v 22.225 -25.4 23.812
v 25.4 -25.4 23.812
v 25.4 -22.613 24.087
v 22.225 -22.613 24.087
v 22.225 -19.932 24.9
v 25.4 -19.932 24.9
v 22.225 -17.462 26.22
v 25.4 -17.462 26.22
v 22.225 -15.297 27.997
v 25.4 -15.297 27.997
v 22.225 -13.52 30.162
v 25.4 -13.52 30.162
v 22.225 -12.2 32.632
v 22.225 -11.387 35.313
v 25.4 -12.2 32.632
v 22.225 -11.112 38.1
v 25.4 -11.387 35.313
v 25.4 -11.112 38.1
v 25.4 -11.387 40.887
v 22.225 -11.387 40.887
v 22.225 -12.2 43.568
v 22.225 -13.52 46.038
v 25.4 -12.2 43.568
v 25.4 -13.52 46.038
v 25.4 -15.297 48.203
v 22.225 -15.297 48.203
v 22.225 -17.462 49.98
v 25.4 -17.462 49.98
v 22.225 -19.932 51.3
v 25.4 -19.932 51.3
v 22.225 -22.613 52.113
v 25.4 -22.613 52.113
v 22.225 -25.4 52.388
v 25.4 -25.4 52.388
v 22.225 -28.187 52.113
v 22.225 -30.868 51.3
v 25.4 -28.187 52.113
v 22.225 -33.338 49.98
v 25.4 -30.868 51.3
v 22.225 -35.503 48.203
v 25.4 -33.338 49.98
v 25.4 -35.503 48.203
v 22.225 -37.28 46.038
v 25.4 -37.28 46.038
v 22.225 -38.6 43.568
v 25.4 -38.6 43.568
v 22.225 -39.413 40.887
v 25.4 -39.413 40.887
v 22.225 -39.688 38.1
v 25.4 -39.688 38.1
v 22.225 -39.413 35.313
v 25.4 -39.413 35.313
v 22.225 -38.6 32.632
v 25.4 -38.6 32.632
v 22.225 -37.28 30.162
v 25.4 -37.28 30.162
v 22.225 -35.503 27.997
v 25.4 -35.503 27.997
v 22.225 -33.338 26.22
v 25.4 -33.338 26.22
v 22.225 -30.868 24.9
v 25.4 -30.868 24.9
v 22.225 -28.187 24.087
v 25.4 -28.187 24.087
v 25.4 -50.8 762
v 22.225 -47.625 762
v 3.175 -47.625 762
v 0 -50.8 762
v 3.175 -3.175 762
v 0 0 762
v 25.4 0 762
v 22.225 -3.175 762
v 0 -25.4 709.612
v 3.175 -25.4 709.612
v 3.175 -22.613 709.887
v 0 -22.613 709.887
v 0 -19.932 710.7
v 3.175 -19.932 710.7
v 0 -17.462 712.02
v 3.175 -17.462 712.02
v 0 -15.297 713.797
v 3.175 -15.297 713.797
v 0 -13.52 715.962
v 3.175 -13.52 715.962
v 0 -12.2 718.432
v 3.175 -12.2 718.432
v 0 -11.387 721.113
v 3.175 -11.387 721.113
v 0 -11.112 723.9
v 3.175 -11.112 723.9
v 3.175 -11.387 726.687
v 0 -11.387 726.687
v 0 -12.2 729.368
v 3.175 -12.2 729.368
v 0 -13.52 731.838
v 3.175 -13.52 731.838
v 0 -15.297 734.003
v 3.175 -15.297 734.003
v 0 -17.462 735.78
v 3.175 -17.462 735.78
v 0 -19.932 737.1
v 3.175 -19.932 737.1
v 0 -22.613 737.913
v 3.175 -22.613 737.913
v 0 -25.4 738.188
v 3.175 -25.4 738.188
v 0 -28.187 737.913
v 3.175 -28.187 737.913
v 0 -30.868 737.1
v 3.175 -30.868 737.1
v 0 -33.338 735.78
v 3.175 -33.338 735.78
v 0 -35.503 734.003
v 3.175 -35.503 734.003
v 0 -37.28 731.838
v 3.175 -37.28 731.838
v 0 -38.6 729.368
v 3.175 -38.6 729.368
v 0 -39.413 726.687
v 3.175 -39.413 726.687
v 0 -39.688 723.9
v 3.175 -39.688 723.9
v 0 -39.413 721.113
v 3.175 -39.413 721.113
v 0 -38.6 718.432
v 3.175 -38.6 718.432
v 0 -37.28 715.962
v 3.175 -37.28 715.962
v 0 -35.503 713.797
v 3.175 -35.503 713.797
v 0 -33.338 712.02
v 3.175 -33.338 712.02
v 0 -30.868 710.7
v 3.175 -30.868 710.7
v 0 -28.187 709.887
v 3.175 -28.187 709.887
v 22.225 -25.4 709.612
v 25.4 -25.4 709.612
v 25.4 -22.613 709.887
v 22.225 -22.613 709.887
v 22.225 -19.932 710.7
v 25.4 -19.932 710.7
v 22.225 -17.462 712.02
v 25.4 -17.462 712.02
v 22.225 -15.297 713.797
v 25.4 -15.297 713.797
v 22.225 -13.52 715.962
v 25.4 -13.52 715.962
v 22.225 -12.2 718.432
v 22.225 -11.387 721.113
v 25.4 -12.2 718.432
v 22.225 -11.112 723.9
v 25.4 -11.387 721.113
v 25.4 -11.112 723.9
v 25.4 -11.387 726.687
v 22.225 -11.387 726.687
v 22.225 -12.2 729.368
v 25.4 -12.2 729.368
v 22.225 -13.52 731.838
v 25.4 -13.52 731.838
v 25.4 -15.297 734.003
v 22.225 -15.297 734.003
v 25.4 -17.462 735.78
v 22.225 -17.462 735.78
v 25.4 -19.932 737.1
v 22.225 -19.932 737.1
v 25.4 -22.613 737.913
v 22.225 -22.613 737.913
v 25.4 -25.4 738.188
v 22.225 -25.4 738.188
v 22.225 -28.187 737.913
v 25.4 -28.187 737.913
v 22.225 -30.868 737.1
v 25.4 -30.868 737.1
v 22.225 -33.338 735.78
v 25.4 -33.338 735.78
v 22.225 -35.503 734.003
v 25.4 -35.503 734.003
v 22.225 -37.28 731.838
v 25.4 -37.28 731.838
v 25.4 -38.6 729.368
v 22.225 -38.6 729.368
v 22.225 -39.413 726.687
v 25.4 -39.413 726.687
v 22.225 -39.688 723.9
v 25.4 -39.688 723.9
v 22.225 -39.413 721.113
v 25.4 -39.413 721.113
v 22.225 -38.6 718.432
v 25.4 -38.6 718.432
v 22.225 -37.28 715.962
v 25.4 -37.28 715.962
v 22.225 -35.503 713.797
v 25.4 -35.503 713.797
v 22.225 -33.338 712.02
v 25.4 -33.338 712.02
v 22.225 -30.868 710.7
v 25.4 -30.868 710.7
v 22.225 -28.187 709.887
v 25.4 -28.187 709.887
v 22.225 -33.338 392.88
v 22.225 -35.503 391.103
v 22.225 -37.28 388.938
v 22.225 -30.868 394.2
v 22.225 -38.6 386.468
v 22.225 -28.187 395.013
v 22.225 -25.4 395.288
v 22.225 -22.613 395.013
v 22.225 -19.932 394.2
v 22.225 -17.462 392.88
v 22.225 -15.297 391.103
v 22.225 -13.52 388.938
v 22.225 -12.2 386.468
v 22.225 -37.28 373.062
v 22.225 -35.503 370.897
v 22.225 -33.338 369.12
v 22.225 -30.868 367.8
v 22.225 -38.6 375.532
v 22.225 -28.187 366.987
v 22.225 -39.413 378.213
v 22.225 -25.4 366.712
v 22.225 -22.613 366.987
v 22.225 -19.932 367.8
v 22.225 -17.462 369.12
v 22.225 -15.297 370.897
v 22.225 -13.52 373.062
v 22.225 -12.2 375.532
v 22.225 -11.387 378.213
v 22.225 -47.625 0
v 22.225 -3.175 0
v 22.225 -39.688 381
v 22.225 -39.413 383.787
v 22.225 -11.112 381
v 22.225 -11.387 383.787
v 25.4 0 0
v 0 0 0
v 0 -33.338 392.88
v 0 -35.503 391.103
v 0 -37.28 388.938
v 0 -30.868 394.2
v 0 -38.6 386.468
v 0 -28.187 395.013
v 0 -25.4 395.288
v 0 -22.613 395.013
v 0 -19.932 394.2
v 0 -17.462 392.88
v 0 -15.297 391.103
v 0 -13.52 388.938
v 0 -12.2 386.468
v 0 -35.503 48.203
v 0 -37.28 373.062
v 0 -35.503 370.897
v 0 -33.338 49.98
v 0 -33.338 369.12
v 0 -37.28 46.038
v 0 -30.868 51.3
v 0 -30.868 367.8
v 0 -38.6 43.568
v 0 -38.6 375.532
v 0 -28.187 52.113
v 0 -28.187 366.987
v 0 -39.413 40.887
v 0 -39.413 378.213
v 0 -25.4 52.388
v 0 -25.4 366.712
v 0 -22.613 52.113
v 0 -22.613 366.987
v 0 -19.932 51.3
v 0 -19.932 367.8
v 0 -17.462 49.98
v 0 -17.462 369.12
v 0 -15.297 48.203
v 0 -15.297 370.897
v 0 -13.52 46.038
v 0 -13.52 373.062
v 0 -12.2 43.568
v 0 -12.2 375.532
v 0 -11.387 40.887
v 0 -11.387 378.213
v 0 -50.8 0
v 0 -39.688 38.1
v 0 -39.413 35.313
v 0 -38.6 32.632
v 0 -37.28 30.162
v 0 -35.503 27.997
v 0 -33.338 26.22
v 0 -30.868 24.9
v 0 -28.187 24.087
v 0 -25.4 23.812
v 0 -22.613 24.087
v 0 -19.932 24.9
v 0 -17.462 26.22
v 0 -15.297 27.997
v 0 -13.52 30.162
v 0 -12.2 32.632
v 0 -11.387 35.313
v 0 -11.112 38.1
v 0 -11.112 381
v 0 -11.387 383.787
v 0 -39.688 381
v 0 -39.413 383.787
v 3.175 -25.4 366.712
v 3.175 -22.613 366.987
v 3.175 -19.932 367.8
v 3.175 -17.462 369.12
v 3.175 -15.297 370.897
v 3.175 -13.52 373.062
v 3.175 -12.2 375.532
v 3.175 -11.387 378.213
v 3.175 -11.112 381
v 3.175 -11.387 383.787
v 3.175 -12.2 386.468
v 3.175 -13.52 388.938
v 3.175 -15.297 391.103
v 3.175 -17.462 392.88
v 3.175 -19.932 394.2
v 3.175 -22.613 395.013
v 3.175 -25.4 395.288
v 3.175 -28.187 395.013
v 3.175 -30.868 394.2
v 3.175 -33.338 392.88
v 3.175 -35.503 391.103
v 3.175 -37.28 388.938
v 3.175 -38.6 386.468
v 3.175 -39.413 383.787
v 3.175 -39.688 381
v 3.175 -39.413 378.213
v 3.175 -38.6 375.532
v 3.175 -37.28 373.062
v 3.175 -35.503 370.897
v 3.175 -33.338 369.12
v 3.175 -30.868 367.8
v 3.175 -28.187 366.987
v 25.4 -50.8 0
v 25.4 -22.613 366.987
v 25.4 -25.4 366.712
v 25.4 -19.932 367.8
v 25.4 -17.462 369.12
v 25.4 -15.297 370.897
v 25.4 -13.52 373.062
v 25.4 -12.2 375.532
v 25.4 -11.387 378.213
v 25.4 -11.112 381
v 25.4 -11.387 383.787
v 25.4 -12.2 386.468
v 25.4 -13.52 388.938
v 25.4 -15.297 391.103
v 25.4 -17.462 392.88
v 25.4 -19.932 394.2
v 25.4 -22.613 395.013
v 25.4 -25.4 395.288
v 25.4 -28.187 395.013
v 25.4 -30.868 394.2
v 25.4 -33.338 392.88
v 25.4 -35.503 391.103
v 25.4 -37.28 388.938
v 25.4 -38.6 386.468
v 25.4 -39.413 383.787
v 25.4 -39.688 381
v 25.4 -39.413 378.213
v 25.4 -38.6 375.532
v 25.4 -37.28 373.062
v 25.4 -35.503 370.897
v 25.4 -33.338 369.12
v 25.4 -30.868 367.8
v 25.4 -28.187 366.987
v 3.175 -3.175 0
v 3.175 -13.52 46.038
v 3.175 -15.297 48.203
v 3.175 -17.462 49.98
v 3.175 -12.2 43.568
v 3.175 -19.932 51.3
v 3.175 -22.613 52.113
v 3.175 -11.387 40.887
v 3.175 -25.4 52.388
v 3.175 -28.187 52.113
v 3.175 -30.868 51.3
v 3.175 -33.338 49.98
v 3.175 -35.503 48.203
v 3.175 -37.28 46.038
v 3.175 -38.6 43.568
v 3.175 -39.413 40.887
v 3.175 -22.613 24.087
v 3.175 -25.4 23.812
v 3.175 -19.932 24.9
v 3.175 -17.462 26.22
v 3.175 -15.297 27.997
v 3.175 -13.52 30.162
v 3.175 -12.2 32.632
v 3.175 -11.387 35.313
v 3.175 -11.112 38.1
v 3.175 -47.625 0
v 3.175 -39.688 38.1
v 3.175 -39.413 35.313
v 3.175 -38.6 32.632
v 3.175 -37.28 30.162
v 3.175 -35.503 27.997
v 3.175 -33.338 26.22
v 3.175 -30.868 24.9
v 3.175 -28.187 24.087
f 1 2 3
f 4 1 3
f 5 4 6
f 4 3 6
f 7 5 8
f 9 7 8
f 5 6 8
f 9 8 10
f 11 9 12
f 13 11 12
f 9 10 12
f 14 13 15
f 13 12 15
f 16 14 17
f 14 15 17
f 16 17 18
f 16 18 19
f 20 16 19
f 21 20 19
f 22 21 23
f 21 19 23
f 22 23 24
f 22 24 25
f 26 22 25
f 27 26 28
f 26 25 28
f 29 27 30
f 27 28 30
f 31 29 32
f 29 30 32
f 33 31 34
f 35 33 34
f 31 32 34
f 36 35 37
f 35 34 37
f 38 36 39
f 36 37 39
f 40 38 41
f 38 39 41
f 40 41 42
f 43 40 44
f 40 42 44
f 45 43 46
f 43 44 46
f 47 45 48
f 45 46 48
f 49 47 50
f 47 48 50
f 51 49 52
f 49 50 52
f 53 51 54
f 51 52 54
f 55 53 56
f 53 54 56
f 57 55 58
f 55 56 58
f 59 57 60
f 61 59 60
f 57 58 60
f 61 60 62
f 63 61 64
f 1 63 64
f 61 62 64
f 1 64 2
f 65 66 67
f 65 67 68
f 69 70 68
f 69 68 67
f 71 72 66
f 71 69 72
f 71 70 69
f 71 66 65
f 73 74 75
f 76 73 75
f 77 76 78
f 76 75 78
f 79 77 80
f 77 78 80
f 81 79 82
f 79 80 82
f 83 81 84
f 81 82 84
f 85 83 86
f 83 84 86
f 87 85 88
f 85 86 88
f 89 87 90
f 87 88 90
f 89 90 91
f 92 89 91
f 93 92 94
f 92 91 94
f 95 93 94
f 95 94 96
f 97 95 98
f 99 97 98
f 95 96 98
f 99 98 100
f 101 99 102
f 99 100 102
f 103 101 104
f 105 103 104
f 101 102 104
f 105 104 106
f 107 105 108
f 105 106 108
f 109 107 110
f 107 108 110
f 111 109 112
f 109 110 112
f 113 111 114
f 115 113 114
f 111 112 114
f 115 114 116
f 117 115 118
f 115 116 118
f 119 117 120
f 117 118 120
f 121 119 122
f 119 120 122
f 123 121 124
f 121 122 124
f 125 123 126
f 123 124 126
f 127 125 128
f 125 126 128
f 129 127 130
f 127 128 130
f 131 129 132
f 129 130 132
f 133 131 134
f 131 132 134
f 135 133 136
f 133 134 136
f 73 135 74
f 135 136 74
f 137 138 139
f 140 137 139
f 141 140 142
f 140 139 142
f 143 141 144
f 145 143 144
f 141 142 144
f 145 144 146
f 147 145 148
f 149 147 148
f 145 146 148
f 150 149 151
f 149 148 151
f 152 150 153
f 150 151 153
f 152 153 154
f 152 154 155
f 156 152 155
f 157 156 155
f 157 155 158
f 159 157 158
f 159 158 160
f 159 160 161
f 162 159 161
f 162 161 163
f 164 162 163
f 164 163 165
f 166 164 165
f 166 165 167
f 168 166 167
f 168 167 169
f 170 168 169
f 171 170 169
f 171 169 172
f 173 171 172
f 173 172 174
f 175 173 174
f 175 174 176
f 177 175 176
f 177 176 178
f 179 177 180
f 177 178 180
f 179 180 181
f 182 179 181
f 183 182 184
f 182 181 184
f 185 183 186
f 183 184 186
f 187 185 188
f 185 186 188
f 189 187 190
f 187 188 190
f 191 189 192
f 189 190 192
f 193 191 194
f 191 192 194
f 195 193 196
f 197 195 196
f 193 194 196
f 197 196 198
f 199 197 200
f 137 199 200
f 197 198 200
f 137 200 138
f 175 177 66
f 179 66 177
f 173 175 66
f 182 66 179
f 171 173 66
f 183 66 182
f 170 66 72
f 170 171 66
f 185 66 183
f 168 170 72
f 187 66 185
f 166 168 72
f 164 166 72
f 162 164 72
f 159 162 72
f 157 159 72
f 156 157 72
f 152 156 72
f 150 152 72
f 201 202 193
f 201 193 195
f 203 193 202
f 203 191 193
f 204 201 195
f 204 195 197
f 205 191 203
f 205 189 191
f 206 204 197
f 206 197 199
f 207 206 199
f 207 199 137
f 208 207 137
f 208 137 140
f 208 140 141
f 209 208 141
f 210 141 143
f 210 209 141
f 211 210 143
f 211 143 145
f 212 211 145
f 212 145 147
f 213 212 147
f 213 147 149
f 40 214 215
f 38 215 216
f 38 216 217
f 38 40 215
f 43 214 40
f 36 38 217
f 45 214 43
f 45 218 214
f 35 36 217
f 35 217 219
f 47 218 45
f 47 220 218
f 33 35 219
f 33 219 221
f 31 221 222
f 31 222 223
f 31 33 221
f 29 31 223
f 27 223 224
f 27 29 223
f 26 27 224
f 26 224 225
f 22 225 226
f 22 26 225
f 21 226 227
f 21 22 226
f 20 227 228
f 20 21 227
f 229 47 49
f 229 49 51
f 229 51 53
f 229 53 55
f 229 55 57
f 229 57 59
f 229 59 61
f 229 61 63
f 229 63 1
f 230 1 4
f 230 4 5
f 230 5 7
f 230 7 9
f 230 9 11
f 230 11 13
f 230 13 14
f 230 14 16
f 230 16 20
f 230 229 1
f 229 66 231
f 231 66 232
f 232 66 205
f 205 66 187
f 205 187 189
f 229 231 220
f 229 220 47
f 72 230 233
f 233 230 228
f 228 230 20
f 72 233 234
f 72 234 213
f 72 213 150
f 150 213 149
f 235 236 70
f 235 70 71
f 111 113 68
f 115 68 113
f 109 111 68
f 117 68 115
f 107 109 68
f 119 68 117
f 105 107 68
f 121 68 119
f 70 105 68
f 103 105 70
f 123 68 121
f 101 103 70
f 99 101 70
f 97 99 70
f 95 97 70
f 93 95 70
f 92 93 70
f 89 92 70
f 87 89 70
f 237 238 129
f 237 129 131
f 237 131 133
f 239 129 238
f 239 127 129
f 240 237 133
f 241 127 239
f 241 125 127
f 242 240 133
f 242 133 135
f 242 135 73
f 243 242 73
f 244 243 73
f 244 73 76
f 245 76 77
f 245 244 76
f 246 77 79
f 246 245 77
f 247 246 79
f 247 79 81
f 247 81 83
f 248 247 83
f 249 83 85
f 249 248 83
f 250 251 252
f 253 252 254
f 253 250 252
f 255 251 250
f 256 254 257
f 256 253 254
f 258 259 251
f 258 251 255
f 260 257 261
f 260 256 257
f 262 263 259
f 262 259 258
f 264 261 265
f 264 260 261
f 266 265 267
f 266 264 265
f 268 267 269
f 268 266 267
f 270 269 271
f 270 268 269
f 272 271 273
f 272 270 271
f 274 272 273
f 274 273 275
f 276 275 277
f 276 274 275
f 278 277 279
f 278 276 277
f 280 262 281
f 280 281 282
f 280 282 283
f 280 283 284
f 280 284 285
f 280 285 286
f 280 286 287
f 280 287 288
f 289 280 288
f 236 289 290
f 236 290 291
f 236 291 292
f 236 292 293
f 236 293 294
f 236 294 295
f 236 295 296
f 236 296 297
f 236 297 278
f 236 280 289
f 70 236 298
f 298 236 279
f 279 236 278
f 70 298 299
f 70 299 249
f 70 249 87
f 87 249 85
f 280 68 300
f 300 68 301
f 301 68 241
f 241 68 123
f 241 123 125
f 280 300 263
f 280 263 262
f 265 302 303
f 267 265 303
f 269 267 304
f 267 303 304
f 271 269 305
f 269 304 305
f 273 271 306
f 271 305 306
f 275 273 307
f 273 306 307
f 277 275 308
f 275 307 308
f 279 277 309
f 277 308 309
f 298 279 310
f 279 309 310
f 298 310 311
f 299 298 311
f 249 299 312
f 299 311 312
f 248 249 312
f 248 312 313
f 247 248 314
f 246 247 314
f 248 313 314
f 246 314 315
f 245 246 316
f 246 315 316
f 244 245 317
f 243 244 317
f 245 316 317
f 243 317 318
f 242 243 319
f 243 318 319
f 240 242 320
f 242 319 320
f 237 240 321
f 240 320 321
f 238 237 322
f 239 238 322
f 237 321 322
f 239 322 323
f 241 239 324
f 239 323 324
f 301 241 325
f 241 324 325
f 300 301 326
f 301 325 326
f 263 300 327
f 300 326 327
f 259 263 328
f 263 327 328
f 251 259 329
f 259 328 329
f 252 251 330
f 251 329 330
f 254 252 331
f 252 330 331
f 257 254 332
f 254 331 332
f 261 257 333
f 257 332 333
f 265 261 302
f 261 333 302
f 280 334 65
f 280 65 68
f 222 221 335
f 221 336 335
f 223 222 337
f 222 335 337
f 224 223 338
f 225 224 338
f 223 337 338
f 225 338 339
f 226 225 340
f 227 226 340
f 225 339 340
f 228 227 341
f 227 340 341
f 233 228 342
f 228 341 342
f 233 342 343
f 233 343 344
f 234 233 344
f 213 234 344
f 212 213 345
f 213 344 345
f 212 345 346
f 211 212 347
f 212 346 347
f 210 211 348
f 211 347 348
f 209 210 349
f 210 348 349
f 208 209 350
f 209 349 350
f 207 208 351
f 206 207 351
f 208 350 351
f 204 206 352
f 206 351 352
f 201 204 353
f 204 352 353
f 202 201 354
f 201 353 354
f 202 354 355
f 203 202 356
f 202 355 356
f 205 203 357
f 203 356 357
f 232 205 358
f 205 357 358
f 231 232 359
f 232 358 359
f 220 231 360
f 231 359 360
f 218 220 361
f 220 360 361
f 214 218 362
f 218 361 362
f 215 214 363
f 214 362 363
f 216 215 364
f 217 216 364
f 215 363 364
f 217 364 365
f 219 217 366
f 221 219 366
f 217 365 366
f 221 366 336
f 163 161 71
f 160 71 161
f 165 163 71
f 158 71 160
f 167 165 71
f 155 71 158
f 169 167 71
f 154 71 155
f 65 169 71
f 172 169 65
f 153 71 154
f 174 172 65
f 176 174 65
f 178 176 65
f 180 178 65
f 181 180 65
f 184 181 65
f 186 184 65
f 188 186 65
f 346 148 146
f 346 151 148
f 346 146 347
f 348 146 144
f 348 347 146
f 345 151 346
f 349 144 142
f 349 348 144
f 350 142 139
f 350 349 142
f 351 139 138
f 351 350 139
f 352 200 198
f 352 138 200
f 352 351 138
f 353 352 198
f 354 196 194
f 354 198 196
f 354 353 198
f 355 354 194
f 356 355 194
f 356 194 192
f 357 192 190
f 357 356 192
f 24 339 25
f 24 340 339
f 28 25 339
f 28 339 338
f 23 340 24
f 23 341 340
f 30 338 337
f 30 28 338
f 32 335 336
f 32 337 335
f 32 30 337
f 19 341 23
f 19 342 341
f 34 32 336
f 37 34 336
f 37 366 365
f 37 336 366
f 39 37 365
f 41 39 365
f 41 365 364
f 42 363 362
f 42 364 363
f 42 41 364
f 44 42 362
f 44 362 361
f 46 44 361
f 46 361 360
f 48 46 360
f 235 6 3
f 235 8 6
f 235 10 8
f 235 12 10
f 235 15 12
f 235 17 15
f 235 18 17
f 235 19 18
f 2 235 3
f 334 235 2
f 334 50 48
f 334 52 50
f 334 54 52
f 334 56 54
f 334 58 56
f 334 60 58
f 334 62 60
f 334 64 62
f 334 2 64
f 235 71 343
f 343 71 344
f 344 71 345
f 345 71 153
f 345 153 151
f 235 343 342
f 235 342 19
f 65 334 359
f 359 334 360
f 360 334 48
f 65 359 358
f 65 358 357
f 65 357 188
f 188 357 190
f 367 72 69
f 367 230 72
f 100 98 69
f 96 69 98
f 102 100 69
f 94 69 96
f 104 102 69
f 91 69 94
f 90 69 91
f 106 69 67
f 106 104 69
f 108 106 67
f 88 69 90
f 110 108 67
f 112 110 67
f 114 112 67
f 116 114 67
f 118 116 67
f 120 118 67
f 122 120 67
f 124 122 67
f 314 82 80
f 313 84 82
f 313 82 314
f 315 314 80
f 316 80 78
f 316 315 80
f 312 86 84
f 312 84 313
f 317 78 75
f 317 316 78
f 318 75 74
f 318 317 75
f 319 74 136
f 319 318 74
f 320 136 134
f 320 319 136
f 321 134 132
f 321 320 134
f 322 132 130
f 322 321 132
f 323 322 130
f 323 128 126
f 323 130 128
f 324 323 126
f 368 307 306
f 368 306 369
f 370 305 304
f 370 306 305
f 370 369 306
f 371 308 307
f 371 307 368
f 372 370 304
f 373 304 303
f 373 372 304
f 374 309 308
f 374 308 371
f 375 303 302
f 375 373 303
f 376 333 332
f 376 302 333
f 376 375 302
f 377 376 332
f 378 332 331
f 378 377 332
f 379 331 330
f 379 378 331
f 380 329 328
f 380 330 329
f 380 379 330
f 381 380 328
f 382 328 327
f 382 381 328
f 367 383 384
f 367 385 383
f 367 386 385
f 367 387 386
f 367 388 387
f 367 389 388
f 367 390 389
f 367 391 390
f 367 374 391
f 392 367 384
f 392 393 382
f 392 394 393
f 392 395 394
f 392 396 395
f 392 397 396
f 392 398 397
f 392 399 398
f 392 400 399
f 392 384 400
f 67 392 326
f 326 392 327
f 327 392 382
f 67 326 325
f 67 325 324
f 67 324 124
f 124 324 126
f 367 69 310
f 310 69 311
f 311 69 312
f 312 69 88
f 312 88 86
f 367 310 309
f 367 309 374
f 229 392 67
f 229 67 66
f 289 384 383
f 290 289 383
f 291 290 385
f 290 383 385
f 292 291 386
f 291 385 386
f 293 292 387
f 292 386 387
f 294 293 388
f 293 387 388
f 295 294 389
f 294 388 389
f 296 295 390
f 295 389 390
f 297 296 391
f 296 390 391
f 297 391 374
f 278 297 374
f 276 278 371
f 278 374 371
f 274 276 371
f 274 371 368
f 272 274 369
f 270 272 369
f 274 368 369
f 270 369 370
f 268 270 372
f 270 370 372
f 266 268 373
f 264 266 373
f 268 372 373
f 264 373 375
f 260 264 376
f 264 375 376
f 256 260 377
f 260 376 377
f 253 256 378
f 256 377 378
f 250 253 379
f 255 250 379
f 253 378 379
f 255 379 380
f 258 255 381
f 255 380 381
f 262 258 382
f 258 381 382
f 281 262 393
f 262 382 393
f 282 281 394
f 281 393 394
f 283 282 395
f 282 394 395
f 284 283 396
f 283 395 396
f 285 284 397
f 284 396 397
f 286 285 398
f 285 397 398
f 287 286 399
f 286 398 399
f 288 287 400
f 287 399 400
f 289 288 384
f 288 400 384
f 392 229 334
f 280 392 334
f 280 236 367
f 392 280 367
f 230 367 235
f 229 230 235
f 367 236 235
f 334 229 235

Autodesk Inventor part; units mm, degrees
ref_plane "YZ Plane" through (0, 0, 0) normal (1, 0, 0) x (0, 1, 0)
ref_plane "XZ Plane" through (0, 0, 0) normal (0, 1, 0) x (-1, 0, 0)
ref_plane "XY Plane" through (0, 0, 0) normal (0, 0, 1) x (1, 0, 0)
sketch "Sketch1" plane through (0, 0, 0) normal (0, 0, 1) x (1, 0, 0)
  line L0 (0, 0) -> (25.4, 0)
  line L1 (25.4, 0) -> (25.4, -50.8)
  line L2 (25.4, -50.8) -> (0, -50.8)
  line L3 (0, -50.8) -> (0, 0)
  line L4 (22.225, -3.175) -> (3.175, -3.175)
  line L5 (3.175, -3.175) -> (3.175, -47.625)
  line L6 (3.175, -47.625) -> (22.225, -47.625)
  line L7 (22.225, -47.625) -> (22.225, -3.175)
  dimension "d0" = 25.4
  dimension "d1" = 50.8
  dimension "d2" = 3.175
extrude "Extrusion1" add sketch "Sketch1" along normal blind 762
sketch "Sketch3" plane through (25.4, -50.8, 0) normal (1, 0, 0) x (0, 0, -1)
  circle A0 centre (-38.1, 25.4) radius 14.2875
  line L0 (0, 50.8) -> (0, 0) projected
  line L1 (0, 50.8) -> (-762, 50.8) projected
  dimension "d13" = 38.1
  dimension "d14" = 25.4
  dimension "d15" = 28.575
extrude "Extrusion3" cut sketch "Sketch3" against normal blind 25.4
sketch "Sketch4" plane through (25.4, -50.8, 0) normal (1, 0, 0) x (0, 0, -1)
  circle A0 centre (-723.9, 25.4) radius 14.2875
  circle A1 centre (-381, 25.4) radius 14.2875
  line L0 (-762, 0) -> (-762, 50.8) projected
  line L1 (0, 50.8) -> (-762, 50.8) projected
  circle A2 centre (-38.1, 25.4) radius 14.2875 projected
  dimension "d19" = 38.1
  dimension "d20" = 25.4
  dimension "d21" = 28.575
  dimension "d22" = 25.4
  dimension "d23" = 28.575
  dimension "d26" = 342.9
  dimension "d27" = 342.9
extrude "Extrusion4" cut sketch "Sketch4" against normal blind 25.4 contours A0 | A1
properties part number "DRL short Angle"
